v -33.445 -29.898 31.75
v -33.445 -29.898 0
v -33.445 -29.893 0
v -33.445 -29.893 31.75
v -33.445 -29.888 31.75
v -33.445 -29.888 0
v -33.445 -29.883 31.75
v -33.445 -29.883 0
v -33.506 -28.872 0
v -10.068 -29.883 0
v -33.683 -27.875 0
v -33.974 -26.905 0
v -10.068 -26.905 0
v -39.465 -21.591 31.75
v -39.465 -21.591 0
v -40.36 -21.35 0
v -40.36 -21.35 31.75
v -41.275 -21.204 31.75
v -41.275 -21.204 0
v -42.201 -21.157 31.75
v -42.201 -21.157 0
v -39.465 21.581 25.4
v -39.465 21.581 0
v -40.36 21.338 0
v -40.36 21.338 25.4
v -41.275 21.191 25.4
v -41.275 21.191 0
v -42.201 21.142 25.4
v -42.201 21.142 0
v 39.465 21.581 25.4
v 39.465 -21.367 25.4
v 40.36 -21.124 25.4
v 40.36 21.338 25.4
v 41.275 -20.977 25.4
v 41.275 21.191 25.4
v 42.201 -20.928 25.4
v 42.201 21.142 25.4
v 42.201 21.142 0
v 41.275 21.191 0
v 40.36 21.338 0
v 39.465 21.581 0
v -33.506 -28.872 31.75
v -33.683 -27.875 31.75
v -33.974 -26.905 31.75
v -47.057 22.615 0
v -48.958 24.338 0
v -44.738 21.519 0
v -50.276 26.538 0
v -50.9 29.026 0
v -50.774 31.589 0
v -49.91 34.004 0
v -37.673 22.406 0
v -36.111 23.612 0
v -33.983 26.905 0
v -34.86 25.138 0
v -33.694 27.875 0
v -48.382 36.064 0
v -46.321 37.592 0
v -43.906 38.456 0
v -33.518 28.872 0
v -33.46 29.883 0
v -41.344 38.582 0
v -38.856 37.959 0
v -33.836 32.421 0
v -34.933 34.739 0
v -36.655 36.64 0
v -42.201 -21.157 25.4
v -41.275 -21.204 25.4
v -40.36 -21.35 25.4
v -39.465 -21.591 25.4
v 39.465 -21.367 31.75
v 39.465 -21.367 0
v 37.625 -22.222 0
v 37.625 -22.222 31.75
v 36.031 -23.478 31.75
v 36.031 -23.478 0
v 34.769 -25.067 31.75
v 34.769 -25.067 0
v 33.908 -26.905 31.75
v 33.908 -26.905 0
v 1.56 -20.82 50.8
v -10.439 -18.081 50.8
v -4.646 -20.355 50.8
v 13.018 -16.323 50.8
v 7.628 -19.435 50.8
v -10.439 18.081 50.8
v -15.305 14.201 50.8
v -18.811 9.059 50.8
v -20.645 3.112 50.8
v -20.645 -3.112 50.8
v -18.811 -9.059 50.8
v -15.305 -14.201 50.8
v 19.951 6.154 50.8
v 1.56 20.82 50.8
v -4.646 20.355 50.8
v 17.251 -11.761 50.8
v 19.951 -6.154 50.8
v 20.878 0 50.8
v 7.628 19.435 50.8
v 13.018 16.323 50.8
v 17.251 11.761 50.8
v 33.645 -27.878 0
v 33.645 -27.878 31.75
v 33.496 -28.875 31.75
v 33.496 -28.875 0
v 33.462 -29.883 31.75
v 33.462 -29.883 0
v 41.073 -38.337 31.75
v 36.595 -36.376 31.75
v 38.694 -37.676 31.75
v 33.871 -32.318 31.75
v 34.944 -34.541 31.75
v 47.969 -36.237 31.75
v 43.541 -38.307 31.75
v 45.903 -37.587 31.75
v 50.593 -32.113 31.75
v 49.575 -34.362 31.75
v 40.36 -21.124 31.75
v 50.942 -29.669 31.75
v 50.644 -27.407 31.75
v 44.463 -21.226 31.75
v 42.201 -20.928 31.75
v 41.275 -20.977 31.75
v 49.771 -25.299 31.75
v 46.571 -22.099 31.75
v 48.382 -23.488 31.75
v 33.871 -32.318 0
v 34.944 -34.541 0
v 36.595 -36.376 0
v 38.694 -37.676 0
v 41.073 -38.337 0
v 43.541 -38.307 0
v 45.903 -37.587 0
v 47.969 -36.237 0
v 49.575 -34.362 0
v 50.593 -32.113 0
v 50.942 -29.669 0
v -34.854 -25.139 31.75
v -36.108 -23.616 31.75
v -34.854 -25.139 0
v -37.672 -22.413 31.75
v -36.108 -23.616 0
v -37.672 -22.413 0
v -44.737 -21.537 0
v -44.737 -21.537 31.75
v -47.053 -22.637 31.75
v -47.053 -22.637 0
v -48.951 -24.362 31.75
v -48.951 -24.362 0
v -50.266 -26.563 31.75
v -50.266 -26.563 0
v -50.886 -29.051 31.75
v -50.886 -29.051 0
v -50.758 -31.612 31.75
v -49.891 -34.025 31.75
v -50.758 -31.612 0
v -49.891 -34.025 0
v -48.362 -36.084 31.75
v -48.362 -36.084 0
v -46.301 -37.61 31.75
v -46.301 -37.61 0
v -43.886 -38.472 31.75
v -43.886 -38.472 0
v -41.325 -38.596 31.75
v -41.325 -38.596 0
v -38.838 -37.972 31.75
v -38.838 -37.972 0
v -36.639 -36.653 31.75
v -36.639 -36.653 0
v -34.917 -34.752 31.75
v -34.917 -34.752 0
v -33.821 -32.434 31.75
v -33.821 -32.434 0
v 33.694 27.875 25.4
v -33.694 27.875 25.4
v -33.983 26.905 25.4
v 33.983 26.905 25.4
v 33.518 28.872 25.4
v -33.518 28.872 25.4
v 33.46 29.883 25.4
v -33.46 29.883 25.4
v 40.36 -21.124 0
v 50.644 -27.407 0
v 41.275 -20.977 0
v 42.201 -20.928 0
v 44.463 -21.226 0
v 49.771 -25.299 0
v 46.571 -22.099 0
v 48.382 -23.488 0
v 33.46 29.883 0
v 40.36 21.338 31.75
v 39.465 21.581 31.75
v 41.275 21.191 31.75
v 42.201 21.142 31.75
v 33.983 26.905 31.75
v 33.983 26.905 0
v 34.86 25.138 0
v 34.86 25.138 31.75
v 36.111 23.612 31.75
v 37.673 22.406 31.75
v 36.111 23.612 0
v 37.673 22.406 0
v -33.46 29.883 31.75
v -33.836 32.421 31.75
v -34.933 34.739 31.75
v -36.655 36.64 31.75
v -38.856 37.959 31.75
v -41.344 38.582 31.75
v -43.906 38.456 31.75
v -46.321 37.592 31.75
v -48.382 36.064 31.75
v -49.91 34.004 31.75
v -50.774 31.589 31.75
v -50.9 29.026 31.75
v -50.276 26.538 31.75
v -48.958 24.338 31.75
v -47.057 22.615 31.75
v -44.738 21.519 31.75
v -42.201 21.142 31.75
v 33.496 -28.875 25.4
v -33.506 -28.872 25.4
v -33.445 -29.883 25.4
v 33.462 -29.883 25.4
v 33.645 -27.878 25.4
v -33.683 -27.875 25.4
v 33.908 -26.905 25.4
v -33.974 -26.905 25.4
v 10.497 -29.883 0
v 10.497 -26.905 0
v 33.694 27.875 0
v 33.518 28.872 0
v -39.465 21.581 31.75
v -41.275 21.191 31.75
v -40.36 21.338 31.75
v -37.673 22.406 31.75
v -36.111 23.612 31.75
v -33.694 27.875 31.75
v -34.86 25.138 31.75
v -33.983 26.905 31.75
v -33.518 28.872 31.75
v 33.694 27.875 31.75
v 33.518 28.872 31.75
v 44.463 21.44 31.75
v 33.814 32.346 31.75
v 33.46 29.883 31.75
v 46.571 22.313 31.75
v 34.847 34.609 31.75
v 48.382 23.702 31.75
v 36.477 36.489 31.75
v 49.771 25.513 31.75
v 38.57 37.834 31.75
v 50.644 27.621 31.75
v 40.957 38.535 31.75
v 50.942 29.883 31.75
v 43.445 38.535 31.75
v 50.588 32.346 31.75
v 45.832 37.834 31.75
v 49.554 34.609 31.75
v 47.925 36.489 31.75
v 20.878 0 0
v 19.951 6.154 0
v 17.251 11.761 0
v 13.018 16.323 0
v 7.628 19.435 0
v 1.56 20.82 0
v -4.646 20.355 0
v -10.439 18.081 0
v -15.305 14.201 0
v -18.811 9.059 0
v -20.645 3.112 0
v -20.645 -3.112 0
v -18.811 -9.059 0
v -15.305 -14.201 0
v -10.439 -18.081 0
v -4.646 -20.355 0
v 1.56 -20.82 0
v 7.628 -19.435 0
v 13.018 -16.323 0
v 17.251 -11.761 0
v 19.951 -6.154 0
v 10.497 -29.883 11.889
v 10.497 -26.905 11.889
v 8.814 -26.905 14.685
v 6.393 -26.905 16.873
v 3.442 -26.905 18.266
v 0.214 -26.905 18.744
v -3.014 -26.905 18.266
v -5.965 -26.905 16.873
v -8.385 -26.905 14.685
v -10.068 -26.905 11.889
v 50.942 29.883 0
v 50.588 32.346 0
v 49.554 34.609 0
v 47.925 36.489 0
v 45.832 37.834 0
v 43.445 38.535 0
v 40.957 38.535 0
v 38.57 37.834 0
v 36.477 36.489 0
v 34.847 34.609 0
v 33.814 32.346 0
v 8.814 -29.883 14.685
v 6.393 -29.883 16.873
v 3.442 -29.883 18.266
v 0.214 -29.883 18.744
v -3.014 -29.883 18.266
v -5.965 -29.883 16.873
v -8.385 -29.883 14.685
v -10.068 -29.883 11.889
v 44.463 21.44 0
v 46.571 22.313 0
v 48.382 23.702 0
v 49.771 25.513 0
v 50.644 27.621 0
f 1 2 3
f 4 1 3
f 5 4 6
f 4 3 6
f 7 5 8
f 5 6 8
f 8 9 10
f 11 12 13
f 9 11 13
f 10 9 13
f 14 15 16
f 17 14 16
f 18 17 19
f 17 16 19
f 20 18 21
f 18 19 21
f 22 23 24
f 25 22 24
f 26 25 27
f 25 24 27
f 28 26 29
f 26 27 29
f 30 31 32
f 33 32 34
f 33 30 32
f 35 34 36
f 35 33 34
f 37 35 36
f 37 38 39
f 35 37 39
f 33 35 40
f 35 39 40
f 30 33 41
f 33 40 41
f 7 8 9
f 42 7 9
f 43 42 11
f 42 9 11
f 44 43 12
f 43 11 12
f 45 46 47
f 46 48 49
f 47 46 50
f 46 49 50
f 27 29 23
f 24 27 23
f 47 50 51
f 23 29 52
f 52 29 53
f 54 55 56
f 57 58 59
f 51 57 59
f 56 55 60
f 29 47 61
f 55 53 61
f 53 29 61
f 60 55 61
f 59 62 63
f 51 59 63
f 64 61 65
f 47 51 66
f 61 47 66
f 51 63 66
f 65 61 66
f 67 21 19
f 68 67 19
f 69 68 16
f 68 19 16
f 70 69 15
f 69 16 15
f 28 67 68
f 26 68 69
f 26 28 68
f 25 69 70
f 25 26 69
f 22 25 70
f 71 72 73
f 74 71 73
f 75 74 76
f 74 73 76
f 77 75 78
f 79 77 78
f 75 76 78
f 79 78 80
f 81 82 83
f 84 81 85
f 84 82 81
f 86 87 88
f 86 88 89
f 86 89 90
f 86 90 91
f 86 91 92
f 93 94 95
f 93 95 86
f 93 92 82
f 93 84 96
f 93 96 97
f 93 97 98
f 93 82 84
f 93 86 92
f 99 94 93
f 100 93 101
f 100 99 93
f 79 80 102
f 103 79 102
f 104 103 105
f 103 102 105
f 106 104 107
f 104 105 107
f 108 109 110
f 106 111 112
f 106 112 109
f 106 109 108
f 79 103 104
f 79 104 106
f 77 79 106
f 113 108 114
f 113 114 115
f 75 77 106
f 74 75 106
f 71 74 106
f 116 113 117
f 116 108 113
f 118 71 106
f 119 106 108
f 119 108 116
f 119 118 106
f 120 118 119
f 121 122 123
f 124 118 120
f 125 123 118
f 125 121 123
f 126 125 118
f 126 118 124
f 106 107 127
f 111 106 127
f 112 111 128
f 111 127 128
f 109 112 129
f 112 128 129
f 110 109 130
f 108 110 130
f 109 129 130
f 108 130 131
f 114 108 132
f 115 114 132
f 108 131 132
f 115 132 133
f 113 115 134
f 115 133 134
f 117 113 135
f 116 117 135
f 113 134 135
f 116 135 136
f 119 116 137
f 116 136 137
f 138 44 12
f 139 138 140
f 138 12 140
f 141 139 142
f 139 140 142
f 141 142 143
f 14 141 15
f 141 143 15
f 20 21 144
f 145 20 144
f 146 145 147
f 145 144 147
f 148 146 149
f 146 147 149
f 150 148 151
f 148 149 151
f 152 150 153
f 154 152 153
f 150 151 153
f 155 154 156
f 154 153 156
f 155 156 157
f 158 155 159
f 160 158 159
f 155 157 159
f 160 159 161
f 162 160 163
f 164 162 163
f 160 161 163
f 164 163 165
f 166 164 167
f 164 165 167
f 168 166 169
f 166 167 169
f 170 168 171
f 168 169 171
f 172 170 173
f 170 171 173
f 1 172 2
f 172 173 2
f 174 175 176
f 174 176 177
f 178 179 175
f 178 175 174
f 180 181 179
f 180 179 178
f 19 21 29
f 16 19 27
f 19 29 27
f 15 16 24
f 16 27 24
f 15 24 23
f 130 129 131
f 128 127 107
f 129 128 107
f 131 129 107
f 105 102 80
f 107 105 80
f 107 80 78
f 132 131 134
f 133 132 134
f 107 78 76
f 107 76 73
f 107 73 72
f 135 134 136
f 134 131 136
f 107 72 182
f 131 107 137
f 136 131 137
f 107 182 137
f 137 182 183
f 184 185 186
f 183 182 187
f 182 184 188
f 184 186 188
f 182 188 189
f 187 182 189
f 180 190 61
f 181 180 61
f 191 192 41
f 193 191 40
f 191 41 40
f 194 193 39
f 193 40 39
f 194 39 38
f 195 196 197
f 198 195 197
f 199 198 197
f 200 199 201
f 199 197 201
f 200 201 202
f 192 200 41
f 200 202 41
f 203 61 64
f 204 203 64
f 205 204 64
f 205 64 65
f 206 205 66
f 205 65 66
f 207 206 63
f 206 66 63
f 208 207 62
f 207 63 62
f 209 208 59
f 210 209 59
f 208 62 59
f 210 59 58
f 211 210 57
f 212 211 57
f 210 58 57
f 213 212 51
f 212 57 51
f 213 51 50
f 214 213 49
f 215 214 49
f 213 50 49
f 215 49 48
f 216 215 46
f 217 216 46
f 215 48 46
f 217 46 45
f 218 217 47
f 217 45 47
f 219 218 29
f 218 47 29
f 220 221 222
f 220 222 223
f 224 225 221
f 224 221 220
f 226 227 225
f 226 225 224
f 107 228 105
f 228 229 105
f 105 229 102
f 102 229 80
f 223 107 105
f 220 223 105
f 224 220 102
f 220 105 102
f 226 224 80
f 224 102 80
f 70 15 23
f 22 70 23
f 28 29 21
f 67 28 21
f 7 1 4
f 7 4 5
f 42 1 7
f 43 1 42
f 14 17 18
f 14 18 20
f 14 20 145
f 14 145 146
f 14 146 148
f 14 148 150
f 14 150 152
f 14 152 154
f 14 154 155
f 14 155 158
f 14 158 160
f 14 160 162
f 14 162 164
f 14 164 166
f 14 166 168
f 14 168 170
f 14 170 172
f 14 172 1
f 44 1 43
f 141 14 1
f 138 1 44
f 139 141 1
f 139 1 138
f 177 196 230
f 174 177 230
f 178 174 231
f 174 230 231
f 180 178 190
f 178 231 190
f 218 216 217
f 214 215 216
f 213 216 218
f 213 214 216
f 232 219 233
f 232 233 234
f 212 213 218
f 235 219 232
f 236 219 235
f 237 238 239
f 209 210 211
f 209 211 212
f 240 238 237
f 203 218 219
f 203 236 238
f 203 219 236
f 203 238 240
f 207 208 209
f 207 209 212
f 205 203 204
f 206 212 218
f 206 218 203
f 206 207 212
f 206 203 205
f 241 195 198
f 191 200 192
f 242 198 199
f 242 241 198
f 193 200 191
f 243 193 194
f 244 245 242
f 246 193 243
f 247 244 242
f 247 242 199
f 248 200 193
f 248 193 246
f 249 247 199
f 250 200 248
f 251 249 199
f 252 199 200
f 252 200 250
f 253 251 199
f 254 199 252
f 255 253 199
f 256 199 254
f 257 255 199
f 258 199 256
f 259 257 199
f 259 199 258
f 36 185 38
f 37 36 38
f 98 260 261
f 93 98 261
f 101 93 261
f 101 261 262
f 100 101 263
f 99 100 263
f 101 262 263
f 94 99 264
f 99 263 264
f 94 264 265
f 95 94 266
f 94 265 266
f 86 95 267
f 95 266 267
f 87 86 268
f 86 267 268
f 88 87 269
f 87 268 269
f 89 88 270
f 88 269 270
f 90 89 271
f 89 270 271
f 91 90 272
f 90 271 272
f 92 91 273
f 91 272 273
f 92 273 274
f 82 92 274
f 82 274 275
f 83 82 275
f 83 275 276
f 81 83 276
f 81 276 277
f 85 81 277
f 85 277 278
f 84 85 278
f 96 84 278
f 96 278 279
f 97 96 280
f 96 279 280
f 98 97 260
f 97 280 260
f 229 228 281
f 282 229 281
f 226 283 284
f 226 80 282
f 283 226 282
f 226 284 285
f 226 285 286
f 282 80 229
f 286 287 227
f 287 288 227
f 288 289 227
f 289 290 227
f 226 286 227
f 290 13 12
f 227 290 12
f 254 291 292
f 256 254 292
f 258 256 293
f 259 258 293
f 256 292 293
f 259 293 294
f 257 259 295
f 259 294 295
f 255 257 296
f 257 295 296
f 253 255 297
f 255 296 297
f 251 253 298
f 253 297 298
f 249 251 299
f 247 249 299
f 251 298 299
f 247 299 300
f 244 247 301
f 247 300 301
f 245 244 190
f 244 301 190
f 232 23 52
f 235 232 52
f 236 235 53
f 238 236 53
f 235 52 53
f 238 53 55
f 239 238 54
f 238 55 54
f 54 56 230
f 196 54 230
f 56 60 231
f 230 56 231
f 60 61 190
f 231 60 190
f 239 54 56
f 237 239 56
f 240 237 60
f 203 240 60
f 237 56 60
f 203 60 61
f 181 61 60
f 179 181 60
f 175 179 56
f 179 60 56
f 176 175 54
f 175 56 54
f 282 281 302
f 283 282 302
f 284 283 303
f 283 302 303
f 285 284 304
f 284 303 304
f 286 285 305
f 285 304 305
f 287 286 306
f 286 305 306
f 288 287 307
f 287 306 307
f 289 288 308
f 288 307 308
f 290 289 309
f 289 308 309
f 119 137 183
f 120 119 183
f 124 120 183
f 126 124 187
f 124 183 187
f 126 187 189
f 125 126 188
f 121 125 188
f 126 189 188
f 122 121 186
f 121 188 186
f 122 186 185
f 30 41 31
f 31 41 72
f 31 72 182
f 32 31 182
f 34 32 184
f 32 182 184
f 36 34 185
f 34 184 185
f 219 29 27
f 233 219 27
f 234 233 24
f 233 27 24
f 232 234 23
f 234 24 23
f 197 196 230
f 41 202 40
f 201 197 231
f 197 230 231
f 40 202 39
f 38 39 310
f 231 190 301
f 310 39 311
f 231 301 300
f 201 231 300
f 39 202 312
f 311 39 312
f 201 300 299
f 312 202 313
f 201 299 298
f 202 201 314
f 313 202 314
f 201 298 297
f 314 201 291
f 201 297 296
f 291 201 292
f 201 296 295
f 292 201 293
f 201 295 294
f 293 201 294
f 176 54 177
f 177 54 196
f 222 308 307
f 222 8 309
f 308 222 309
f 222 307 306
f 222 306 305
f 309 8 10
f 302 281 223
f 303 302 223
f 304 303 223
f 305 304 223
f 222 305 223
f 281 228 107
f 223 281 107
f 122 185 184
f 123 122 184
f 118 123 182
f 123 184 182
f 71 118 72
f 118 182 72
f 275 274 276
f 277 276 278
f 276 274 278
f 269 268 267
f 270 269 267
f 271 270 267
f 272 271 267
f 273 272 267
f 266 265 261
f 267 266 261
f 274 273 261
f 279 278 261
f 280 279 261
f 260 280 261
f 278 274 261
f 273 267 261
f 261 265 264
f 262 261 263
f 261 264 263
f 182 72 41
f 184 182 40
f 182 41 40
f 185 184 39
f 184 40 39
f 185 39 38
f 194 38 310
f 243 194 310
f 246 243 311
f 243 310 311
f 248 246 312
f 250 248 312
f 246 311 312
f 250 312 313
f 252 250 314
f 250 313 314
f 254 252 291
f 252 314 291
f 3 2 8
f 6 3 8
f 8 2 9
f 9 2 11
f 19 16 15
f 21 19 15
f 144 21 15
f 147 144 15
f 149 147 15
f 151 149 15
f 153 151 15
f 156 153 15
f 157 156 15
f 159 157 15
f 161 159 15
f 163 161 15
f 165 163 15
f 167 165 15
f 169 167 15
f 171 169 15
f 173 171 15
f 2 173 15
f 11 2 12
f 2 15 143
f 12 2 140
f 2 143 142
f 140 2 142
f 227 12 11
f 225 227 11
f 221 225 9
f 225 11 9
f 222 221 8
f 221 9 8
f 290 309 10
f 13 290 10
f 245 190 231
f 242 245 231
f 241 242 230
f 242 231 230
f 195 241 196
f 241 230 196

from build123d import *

# Parameters (mm, degrees)
F1_DEPTH = 25.4
F2_DEPTH = 31.75
F0_R     = 20.8784550172
F3_DEPTH = 50.8
F5_DEPTH = 25.4


with BuildPart() as f1:
    # F0 (on Top) → F1 (new body)
    with BuildSketch(Plane.XY):
        with BuildLine():
            ThreePointArc((33.9828109176, 26.9048549235), (33.5914941612, 28.3712616954), (33.4597308818, 29.8832524568))
            Line((33.4597308818, 29.8832524568), (-33.4597346071, 29.8832524568))
            ThreePointArc((-33.4597346071, 29.8832524568), (-33.591497554, 28.3712617257), (-33.9828139678, 26.9048549235))
            Line((-33.9828139678, 26.9048549235), (33.9828109176, 26.9048549235))
        make_face()
    extrude(amount=F1_DEPTH)


with BuildPart() as f1b:
    # F0 (on Top) → F1, piece 2 (new body)
    with BuildSketch(Plane.XY):
        with BuildLine():
            ThreePointArc((-39.4652858377, 21.5813073864), (-40.8155006753, 21.2527209348), (-42.2007255256, 21.1422615383))
            Line((-42.2007255256, 21.1422615383), (-42.2007255256, -21.1567425473))
            ThreePointArc((-42.2007255256, -21.1567425473), (-40.8156954821, -21.2648485586), (-39.4652858377, -21.5910217079))
            Line((-39.4652858377, -21.5910217079), (-39.4652858377, 21.5813073864))
        make_face()
    extrude(amount=F1_DEPTH)


with BuildPart() as f1c:
    # F0 (on Top) → F1, piece 3 (new body)
    with BuildSketch(Plane.XY):
        with BuildLine():
            Line((42.2007255256, -20.9280461702), (42.2007255256, 21.1422634009))
            ThreePointArc((42.2007255256, 21.1422634009), (40.8155007255, 21.2527221915), (39.4652858377, 21.5813080216))
            Line((39.4652858377, 21.5813080216), (39.4652858377, -21.3670920184))
            ThreePointArc((39.4652858377, -21.3670920184), (40.8155006753, -21.0385055668), (42.2007255256, -20.9280461702))
        make_face()
    extrude(amount=F1_DEPTH)


with BuildPart() as f1d:
    # F0 (on Top) → F1, piece 4 (new body)
    with BuildSketch(Plane.XY):
        with BuildLine():
            ThreePointArc((33.4623598882, -29.8832524568), (33.5560958311, -28.3747034059), (33.9083061443, -26.9048549235))
            Line((33.9083061443, -26.9048549235), (-33.9735996091, -26.9048549235))
            ThreePointArc((-33.9735996091, -26.9048549235), (-33.5796202507, -28.3710260767), (-33.4452738296, -29.8832524568))
            Line((-33.4452738296, -29.8832524568), (33.4623598882, -29.8832524568))
        make_face()
    extrude(amount=F1_DEPTH)

    # F4 (on face) → F5 (cut)
    with BuildSketch(Plane.XZ.offset(29.8832524568)):
        with BuildLine():
            Line((-10.068193078, 11.8890367448), (-10.068193078, 0))
            Line((-10.068193078, 0), (10.4966256768, 0))
            Line((10.4966256768, 0), (10.4966256768, 11.8890367448))
            ThreePointArc((10.4966256768, 11.8890367448), (0.2142162994, 18.743975088), (-10.068193078, 11.8890367448))
        make_face()
    extrude(amount=-F5_DEPTH, mode=Mode.SUBTRACT)


with BuildPart() as f2:
    # F0 (on Top) → F2 (new body)
    with BuildSketch(Plane.XY):
        with BuildLine():
            ThreePointArc((-33.9828139678, 26.9048549235), (-33.591497554, 28.3712617257), (-33.4597346071, 29.8832524568))
            ThreePointArc((-33.4597346071, 29.8832524568), (-48.3815394784, 36.0640664096), (-42.2007255256, 21.1422615383))
            ThreePointArc((-42.2007255256, 21.1422615383), (-40.8155006753, 21.2527209348), (-39.4652858377, 21.5813073864))
            ThreePointArc((-39.4652858377, 21.5813073864), (-36.1114714274, 23.6122153205), (-33.9828139678, 26.9048549235))
        make_face()
    extrude(amount=F2_DEPTH)


with BuildPart() as f2b:
    # F0 (on Top) → F2, piece 2 (new body)
    with BuildSketch(Plane.XY):
        with BuildLine():
            ThreePointArc((50.9417127189, 29.8832543194), (42.200720869, 38.624245238), (33.4597308818, 29.8832524568))
            ThreePointArc((33.4597308818, 29.8832524568), (33.5914941612, 28.3712616954), (33.9828109176, 26.9048549235))
            ThreePointArc((33.9828109176, 26.9048549235), (36.1114698198, 23.6122151269), (39.4652858377, 21.5813080216))
            ThreePointArc((39.4652858377, 21.5813080216), (40.8155007255, 21.2527221915), (42.2007255256, 21.1422634009))
            ThreePointArc((42.2007255256, 21.1422634009), (48.3815370702, 23.7024416837), (50.9417127189, 29.8832543194))
        make_face()
    extrude(amount=F2_DEPTH)


with BuildPart() as f2c:
    # F0 (on Top) → F2, piece 3 (new body)
    with BuildSketch(Plane.XY):
        with BuildLine():
            ThreePointArc((50.9417164441, -29.6690370888), (48.3815394784, -23.488223136), (42.2007255256, -20.9280461702))
            ThreePointArc((42.2007255256, -20.9280461702), (40.8155006753, -21.0385055668), (39.4652858377, -21.3670920184))
            ThreePointArc((39.4652858377, -21.3670920184), (36.0306263845, -23.4775268669), (33.9083061443, -26.9048549235))
            ThreePointArc((33.9083061443, -26.9048549235), (33.5560958311, -28.3747034059), (33.4623598882, -29.8832524568))
            ThreePointArc((33.4623598882, -29.8832524568), (42.3078412528, -38.4093716624), (50.9417164441, -29.6690370888))
        make_face()
    extrude(amount=F2_DEPTH)


with BuildPart() as f2d:
    # F0 (on Top) → F2, piece 4 (new body)
    with BuildSketch(Plane.XY):
        with BuildLine():
            ThreePointArc((-39.4652858377, -21.5910217079), (-40.8156954821, -21.2648485586), (-42.2007255256, -21.1567425473))
            ThreePointArc((-42.2007255256, -21.1567425473), (-48.361947715, -36.0836502116), (-33.4452618543, -29.8977214843))
            ThreePointArc((-33.4452618543, -29.8977214843), (-33.4452648481, -29.8904869681), (-33.4452738296, -29.8832524568))
            ThreePointArc((-33.4452738296, -29.8832524568), (-33.5796202507, -28.3710260767), (-33.9735996091, -26.9048549235))
            ThreePointArc((-33.9735996091, -26.9048549235), (-36.1079949651, -23.6160255142), (-39.4652858377, -21.5910217079))
        make_face()
    extrude(amount=F2_DEPTH)


with BuildPart() as f3:
    # F0 (on Top) → F3 (new body)
    with BuildSketch(Plane.XY):
        Circle(F0_R)
    extrude(amount=F3_DEPTH)


solid = Compound([f1.part, f1b.part, f1c.part, f1d.part, f2.part, f2b.part, f2c.part, f2d.part, f3.part])
